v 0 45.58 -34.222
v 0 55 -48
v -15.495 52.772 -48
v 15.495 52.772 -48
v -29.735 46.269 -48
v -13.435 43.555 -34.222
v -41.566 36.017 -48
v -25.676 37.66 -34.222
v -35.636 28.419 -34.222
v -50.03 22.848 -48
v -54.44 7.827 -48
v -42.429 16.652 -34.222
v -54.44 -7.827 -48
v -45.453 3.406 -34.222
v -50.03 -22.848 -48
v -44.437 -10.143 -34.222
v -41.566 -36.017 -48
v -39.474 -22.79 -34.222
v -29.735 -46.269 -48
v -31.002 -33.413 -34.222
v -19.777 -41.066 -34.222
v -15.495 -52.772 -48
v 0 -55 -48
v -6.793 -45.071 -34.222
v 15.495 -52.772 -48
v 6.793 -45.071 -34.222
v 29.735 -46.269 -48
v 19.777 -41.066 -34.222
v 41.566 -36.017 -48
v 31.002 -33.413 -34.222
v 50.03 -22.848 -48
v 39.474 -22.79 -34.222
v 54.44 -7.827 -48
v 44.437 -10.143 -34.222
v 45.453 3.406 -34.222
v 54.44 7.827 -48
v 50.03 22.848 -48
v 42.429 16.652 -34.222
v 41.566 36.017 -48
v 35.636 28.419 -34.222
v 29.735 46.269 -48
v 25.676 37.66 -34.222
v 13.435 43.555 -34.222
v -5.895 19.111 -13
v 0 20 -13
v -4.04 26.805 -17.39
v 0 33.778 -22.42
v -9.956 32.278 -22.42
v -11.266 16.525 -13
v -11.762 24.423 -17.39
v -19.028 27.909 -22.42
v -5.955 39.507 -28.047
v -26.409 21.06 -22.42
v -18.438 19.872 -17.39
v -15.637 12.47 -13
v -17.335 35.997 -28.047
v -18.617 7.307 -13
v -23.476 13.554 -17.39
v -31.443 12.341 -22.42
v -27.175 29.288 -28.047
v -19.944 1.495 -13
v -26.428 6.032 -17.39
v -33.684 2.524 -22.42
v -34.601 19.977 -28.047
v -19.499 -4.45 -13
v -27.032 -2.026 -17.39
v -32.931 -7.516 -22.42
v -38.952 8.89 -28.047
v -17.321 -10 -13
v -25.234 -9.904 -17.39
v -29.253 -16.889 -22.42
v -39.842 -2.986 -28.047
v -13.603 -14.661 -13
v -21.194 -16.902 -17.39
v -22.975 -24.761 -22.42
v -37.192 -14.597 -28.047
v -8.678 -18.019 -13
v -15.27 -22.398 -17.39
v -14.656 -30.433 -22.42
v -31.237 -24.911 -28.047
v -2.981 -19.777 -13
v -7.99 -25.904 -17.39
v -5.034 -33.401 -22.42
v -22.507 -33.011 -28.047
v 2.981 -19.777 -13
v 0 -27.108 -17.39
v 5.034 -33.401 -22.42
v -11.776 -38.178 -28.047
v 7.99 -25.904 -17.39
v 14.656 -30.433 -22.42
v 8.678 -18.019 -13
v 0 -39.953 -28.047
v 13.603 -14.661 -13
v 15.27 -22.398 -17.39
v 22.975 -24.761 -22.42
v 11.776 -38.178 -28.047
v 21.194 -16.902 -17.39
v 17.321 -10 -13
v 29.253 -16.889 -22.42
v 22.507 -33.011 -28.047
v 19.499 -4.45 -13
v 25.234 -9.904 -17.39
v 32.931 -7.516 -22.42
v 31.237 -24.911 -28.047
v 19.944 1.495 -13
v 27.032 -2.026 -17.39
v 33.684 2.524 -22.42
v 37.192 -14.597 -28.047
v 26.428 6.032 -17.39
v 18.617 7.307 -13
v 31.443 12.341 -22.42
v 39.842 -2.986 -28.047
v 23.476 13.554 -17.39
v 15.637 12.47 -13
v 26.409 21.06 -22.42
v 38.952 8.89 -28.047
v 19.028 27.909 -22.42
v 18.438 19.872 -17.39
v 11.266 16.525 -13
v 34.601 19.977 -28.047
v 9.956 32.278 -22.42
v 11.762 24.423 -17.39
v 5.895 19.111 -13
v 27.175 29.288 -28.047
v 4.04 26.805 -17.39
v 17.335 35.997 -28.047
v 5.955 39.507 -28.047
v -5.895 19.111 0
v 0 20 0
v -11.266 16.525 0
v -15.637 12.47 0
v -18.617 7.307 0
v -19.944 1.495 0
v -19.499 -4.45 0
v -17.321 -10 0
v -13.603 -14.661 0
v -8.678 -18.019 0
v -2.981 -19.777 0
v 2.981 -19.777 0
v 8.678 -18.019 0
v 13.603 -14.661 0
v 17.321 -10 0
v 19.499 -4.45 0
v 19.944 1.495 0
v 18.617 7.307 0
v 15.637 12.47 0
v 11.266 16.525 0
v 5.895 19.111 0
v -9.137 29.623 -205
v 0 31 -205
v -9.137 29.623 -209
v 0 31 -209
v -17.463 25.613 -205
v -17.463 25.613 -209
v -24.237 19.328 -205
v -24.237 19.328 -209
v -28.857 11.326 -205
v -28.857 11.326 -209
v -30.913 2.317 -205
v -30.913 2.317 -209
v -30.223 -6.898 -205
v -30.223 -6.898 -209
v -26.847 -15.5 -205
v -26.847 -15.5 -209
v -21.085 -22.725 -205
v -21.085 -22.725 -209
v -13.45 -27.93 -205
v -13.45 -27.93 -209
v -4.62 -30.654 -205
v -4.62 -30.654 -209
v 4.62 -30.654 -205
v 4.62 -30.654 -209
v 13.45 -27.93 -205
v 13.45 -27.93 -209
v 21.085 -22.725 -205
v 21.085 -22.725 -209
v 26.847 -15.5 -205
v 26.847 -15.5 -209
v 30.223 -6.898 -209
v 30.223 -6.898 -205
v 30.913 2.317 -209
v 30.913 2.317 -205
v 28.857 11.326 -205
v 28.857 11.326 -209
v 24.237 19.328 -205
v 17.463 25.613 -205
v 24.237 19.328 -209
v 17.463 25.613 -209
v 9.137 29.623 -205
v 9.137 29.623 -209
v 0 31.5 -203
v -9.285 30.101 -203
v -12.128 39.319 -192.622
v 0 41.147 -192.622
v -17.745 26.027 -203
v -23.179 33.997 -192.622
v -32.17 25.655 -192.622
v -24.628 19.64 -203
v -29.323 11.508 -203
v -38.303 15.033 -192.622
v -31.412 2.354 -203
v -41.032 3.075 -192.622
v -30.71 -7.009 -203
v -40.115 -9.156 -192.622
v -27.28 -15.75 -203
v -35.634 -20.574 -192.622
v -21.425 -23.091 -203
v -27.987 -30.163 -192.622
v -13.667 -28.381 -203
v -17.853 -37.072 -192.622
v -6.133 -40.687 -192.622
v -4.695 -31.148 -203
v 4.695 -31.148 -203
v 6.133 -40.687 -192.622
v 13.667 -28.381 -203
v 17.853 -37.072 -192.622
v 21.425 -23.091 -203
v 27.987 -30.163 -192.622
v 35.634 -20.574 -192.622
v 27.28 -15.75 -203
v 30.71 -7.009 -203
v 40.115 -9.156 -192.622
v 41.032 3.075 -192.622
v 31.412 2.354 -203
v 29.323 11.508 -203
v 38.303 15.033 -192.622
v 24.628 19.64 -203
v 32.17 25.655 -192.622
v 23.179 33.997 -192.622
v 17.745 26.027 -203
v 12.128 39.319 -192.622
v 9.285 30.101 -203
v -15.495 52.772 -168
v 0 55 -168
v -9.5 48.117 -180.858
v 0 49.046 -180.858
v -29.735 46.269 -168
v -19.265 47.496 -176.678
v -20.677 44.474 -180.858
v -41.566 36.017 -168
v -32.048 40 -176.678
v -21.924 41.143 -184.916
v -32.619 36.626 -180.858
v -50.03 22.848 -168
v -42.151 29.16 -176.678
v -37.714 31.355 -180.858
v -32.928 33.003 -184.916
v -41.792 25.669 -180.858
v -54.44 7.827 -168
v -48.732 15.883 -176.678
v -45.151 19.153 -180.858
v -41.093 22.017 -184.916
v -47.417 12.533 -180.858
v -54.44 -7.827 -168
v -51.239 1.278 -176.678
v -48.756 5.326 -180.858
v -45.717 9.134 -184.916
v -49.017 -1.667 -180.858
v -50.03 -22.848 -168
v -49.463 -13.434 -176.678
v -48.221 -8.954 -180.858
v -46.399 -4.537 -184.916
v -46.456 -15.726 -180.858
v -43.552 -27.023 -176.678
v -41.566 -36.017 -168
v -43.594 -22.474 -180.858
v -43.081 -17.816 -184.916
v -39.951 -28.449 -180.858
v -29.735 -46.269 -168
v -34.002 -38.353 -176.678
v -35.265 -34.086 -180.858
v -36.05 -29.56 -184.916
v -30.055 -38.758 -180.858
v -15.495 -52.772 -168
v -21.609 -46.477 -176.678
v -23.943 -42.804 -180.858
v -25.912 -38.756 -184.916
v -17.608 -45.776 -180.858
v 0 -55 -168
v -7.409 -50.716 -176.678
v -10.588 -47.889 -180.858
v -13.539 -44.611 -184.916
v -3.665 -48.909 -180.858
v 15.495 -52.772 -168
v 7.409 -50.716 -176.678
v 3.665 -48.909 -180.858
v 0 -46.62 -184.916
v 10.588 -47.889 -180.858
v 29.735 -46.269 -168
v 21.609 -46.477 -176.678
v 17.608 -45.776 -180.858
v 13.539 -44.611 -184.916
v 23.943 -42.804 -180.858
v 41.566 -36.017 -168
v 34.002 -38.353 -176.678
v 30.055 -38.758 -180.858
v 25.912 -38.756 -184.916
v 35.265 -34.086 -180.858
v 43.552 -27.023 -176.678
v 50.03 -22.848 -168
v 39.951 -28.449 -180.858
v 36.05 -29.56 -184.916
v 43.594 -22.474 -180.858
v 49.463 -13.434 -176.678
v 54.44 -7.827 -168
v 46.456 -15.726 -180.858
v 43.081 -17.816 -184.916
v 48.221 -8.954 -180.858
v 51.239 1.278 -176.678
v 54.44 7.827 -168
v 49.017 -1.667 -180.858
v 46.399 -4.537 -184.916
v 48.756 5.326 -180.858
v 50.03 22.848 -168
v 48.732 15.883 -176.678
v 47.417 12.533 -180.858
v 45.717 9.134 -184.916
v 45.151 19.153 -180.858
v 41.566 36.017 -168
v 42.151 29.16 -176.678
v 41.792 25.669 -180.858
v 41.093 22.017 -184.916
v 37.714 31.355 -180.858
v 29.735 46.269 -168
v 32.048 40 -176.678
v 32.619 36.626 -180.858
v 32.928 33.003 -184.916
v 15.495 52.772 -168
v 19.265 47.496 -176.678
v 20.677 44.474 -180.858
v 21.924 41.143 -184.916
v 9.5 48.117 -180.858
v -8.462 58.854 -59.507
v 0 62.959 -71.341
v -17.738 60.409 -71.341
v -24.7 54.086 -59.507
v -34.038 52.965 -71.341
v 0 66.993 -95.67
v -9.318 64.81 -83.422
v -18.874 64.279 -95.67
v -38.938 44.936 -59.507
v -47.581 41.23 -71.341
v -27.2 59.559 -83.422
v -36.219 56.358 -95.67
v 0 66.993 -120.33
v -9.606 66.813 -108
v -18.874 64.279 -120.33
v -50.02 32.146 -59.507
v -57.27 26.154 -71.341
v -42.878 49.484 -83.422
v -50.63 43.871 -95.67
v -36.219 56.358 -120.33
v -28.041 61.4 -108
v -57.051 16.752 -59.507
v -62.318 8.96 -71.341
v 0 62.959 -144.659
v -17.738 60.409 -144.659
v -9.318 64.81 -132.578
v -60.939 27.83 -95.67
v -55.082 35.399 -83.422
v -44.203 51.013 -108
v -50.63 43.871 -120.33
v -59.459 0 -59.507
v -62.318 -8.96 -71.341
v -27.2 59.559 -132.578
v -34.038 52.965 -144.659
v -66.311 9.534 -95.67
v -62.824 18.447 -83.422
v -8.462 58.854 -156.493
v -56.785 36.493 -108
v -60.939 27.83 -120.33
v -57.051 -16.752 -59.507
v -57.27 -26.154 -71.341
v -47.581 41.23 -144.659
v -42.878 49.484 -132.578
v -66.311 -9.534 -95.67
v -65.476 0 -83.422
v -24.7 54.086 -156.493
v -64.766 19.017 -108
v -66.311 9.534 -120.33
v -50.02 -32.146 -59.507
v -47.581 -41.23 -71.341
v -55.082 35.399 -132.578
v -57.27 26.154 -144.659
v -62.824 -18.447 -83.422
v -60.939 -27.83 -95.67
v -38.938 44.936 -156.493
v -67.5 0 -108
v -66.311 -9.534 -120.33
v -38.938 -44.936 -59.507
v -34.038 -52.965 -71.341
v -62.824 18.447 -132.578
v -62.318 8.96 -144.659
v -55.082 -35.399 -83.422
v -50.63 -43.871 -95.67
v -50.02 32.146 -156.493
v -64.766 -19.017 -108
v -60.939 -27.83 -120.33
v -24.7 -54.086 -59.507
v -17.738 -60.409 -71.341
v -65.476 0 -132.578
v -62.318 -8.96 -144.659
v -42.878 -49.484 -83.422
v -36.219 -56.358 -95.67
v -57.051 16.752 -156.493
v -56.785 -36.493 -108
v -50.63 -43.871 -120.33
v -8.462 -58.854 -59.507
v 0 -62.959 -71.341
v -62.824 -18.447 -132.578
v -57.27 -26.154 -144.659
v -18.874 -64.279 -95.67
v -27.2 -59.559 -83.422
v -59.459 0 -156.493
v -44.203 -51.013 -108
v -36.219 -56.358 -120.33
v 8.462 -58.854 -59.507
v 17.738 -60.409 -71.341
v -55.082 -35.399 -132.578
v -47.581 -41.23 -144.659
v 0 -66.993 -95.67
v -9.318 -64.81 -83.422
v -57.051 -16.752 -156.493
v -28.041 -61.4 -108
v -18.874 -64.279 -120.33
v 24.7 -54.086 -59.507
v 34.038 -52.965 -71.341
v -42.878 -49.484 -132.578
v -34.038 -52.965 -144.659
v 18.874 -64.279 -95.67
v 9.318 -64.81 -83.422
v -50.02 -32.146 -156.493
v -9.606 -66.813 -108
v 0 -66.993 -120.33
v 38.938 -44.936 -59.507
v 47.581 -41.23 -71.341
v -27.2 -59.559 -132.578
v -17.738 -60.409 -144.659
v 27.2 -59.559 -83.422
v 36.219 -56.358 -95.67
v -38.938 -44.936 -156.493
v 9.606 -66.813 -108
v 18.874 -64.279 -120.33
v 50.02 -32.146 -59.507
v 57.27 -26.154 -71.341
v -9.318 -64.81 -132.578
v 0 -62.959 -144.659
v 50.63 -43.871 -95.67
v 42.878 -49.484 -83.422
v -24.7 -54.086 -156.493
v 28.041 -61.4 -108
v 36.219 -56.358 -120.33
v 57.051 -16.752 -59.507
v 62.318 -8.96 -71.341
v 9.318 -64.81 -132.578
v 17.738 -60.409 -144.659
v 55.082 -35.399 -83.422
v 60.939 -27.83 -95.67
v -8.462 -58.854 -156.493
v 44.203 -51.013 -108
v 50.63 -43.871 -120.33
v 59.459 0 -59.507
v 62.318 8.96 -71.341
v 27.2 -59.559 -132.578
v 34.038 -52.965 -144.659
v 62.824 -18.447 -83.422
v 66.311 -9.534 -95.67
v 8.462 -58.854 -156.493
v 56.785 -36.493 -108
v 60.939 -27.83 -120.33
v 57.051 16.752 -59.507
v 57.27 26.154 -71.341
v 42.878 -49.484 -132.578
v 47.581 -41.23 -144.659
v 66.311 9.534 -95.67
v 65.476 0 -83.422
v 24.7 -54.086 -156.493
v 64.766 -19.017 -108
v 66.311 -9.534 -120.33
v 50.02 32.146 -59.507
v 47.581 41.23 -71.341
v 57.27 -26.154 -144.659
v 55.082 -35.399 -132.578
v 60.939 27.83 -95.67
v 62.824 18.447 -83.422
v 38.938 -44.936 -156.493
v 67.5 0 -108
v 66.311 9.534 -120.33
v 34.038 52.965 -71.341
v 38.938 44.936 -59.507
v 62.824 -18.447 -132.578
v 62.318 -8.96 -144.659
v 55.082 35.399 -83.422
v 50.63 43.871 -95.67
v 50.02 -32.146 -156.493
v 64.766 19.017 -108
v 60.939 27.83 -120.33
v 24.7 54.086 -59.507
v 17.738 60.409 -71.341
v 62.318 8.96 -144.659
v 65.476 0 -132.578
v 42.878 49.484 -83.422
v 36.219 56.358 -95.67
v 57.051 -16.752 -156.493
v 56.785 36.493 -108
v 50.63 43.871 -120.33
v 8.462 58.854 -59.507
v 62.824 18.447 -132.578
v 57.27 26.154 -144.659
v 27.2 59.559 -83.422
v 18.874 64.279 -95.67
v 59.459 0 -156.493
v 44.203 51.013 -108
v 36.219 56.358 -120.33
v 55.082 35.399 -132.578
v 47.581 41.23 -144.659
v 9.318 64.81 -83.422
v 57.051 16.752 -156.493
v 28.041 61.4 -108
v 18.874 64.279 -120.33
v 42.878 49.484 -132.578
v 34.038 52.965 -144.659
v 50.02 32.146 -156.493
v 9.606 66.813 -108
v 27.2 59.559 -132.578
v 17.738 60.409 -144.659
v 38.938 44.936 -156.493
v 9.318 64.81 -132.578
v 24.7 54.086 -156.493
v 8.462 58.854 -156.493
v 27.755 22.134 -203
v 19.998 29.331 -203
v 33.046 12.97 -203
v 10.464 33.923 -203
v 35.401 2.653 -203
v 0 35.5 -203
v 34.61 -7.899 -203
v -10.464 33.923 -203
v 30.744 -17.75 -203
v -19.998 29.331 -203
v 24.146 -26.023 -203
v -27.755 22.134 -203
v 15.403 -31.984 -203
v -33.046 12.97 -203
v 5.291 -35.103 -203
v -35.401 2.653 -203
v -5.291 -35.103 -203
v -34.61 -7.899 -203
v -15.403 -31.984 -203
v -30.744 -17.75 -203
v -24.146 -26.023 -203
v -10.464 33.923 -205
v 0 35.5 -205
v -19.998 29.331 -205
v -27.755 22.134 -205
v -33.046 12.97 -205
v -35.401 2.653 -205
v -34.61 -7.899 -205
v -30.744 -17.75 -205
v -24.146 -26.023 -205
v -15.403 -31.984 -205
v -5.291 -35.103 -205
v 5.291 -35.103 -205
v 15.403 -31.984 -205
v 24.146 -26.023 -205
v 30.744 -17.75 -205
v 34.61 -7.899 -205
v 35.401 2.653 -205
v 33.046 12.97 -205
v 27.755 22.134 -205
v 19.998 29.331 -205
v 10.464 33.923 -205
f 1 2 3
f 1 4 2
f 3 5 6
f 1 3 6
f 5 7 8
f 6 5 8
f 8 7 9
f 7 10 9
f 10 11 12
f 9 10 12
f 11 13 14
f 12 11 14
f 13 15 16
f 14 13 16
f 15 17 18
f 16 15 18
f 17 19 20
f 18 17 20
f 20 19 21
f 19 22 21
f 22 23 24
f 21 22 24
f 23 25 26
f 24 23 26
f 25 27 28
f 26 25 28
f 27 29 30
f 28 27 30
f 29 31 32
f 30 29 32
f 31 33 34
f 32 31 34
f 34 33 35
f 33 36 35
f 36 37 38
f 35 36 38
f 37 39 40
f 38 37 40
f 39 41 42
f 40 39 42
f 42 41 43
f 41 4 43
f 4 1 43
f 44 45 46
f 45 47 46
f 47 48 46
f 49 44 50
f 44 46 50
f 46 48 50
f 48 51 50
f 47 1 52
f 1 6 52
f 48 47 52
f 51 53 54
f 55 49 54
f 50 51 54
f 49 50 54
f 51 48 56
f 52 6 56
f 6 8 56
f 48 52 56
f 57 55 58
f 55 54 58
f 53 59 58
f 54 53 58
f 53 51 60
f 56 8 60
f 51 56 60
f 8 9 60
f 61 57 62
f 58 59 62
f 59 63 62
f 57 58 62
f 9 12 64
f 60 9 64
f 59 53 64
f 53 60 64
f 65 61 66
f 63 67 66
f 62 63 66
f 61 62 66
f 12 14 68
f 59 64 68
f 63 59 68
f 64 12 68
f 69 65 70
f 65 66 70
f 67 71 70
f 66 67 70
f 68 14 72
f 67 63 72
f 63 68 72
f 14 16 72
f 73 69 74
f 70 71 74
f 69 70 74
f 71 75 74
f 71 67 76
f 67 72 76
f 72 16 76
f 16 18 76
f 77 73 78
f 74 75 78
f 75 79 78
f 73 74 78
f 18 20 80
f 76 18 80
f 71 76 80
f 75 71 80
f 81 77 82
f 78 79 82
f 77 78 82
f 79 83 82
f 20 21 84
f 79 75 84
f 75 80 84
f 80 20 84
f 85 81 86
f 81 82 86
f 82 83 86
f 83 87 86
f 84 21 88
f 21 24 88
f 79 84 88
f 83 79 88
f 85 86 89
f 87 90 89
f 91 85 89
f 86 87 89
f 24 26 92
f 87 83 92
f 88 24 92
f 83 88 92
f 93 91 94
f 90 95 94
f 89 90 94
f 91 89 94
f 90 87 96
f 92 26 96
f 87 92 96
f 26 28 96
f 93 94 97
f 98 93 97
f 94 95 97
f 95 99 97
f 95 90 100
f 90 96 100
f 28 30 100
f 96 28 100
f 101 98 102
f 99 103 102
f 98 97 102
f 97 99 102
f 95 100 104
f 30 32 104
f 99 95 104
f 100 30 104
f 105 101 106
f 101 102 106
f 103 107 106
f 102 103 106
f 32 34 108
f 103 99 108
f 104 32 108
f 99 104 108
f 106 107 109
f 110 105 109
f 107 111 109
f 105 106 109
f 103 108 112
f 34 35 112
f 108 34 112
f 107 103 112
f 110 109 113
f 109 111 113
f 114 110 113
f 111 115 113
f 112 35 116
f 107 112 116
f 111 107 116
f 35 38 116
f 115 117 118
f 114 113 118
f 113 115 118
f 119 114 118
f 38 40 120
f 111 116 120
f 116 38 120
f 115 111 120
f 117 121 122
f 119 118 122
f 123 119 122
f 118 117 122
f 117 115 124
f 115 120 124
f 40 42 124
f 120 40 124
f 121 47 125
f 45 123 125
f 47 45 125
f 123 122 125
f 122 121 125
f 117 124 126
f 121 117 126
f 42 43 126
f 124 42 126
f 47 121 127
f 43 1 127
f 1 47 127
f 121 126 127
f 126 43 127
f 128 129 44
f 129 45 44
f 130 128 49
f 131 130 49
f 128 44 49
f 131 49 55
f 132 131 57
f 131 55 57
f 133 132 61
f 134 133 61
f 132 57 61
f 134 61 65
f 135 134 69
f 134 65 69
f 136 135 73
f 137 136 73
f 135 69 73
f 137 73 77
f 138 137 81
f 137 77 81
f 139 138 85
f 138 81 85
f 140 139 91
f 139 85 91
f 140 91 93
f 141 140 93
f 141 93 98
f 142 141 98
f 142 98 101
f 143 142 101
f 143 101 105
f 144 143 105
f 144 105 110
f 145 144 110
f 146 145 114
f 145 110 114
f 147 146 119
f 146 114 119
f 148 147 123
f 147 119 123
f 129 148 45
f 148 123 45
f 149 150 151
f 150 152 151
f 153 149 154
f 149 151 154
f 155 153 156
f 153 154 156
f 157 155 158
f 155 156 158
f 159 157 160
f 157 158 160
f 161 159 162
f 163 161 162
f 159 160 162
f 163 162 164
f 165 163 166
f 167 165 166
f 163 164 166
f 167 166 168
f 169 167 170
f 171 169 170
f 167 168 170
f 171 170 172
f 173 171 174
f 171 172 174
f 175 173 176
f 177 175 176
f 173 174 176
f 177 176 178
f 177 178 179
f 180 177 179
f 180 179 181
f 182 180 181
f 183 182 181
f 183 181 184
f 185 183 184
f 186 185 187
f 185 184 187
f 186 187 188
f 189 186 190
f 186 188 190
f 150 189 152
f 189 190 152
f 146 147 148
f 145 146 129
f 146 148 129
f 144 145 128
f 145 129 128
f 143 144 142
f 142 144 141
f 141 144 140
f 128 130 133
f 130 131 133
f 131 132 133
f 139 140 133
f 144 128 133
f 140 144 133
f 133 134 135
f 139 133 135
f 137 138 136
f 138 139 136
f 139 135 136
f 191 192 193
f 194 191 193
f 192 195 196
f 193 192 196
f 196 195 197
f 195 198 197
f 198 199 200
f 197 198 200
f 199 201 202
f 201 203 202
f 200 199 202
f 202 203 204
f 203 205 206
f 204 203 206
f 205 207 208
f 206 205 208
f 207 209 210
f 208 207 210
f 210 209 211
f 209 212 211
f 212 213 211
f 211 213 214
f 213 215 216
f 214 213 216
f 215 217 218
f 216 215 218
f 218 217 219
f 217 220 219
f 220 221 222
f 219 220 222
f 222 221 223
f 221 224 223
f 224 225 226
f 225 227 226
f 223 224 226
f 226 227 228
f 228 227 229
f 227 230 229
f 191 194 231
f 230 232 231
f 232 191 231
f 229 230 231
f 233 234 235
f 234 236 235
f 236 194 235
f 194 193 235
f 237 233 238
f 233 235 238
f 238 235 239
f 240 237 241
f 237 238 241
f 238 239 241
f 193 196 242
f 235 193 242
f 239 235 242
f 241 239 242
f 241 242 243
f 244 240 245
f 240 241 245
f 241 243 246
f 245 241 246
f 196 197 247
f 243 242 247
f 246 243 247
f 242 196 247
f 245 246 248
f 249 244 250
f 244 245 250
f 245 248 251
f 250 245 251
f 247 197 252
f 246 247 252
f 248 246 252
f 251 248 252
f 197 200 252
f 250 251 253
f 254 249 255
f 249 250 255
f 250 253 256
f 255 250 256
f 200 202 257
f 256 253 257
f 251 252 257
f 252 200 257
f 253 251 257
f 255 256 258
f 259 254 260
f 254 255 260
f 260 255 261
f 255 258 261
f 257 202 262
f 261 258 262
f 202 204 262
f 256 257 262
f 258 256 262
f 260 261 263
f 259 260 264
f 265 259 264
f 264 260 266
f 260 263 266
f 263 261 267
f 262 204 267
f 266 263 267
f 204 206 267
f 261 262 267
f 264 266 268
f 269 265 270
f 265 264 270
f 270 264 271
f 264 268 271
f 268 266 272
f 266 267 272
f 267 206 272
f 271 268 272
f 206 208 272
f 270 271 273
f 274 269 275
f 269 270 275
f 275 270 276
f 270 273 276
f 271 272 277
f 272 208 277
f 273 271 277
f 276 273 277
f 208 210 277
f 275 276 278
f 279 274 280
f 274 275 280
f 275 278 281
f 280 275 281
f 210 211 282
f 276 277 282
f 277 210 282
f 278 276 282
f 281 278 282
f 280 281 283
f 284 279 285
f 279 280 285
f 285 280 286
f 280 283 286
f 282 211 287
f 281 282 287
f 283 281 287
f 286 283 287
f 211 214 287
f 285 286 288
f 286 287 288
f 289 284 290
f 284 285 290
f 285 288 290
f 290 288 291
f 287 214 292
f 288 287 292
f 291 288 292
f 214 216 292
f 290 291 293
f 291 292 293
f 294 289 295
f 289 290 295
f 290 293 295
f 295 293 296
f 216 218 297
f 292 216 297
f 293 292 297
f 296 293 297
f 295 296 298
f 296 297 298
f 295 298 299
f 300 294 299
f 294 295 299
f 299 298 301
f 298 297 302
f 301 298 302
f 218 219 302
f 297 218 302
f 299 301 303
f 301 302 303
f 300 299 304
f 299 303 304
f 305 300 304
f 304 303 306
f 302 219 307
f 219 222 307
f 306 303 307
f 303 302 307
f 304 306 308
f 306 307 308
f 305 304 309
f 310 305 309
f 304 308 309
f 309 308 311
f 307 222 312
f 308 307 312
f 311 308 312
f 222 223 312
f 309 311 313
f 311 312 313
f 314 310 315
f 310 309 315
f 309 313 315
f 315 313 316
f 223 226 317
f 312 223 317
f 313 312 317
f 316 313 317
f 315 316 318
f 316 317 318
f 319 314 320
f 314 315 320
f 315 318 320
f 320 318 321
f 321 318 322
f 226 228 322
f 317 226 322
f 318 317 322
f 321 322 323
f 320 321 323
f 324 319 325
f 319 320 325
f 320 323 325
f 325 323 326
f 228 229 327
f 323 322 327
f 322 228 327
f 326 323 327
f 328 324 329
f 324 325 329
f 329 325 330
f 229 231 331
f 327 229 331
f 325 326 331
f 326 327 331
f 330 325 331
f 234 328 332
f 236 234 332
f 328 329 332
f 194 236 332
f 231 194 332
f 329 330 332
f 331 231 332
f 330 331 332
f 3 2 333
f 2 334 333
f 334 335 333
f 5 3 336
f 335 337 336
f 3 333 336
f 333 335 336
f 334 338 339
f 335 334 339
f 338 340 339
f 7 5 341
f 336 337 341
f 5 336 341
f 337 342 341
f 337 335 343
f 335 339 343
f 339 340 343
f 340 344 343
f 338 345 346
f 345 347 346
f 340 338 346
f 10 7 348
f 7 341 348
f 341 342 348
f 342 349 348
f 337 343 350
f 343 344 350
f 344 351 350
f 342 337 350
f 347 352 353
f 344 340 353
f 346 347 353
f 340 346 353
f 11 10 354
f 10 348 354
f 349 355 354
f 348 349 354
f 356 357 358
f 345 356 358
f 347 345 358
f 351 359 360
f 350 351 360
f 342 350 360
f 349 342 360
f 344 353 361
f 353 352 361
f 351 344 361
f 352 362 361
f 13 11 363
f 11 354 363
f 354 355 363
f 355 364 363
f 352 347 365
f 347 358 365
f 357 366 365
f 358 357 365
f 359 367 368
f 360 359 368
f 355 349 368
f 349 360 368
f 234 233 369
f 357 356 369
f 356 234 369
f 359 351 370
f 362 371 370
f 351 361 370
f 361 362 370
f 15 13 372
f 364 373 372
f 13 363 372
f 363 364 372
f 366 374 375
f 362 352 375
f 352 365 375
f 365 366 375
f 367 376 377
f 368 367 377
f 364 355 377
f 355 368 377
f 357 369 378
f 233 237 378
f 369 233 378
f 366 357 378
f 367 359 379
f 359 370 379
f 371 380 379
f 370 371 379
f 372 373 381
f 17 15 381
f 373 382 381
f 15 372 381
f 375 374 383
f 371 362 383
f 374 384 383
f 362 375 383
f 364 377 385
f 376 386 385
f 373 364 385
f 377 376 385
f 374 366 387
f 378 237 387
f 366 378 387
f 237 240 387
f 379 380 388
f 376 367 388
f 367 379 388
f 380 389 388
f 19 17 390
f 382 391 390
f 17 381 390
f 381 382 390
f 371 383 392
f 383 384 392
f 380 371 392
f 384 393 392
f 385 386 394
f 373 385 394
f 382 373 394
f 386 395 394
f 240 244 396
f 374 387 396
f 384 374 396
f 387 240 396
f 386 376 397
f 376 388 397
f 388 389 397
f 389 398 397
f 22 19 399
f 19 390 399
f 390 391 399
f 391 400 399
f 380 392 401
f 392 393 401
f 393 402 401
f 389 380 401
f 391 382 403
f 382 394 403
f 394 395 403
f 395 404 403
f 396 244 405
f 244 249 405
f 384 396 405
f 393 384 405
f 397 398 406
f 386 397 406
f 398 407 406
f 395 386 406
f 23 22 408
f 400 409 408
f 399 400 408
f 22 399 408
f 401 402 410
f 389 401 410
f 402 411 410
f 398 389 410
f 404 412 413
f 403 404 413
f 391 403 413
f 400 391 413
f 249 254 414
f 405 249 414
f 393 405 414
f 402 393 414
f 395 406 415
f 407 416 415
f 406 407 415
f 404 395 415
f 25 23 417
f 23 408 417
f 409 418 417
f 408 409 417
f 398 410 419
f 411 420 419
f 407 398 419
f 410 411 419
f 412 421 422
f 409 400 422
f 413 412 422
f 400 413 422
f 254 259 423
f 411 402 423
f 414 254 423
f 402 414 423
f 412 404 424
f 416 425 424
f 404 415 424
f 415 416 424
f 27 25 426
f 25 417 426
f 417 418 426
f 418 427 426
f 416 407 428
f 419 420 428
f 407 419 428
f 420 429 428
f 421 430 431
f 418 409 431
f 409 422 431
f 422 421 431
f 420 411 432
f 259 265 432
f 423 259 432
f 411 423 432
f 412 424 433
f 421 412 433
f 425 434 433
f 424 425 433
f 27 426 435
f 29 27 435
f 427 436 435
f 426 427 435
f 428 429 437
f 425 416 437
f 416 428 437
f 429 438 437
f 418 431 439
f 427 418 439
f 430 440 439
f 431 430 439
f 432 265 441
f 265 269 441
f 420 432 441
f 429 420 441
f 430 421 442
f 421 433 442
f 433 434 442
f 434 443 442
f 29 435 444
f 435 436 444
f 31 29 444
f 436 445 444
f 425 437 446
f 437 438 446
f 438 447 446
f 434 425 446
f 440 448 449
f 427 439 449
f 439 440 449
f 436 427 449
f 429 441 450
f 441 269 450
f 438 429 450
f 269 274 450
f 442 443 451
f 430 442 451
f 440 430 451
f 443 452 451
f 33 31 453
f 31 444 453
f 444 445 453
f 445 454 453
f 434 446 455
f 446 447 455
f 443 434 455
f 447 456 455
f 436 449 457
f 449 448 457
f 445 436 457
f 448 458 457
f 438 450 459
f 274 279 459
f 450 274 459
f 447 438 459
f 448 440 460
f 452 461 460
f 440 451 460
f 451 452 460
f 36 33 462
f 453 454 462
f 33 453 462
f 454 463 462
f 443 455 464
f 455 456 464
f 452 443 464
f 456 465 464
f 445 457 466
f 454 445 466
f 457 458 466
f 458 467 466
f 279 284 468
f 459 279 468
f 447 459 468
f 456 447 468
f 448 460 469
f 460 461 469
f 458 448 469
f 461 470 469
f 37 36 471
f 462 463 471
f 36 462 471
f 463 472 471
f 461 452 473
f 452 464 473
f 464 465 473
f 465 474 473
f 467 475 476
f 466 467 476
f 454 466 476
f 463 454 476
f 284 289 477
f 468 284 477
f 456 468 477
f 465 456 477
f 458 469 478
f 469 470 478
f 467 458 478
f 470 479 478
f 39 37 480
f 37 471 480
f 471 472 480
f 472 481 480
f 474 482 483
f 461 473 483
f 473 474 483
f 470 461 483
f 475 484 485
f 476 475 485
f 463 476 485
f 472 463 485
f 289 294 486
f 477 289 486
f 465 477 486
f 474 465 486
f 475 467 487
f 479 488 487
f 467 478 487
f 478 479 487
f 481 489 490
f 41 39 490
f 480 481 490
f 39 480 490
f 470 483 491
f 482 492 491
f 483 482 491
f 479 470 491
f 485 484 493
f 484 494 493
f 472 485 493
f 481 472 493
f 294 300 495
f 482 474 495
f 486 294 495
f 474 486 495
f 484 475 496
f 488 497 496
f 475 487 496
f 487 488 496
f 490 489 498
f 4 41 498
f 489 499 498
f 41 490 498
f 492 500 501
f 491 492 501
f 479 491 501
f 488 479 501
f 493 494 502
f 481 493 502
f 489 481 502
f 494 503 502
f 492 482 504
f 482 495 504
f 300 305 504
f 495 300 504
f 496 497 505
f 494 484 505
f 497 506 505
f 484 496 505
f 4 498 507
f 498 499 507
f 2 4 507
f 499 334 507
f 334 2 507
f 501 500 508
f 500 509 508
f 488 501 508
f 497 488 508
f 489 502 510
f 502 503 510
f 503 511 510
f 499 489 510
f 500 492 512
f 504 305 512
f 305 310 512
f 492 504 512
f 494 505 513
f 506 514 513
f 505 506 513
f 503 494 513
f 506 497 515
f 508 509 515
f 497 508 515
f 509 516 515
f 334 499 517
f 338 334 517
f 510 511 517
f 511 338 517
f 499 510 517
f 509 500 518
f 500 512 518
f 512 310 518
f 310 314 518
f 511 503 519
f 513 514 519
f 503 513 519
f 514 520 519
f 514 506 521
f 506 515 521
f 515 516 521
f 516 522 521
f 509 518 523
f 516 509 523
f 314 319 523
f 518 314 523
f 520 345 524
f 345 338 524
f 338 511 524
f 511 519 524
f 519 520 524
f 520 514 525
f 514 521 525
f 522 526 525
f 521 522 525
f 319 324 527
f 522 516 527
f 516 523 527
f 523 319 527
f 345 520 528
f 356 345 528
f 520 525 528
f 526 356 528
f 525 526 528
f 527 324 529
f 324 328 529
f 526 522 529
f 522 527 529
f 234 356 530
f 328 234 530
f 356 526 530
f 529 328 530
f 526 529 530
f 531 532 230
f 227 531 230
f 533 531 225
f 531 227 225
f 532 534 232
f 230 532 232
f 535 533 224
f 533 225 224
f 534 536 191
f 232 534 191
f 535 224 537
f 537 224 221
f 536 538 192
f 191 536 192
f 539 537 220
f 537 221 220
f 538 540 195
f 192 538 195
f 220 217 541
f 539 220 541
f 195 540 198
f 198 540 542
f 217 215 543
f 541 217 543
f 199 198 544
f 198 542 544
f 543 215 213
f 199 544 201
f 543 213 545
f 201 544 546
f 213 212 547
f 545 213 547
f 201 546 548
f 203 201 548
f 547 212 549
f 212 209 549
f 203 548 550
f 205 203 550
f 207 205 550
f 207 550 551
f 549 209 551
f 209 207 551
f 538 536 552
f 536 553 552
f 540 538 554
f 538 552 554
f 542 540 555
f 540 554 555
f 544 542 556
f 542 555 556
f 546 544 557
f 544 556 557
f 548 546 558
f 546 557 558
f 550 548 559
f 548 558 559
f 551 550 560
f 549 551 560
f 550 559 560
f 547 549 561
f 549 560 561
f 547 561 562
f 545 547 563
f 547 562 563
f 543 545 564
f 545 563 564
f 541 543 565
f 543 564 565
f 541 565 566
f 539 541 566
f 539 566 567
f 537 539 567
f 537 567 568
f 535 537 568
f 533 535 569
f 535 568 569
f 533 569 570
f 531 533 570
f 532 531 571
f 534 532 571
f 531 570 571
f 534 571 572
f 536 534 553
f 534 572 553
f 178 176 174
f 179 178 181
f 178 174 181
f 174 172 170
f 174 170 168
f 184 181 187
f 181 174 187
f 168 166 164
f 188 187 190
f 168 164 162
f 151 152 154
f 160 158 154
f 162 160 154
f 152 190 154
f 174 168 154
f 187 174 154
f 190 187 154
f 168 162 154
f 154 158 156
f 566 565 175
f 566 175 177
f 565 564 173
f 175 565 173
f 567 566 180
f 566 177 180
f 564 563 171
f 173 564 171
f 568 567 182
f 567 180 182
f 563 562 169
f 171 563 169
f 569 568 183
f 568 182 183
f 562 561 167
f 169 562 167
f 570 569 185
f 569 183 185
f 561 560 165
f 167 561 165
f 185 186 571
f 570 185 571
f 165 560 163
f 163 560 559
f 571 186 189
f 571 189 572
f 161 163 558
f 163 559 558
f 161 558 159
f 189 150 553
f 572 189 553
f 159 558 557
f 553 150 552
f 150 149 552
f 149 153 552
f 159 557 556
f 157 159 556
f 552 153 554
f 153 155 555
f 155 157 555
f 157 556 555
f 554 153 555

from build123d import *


with BuildPart() as part:
    # Sketch1 → Revolve1 (revolve)
    with BuildSketch(Plane(origin=(0, 0, 0), x_dir=(0, 0, -1), z_dir=(1, 0, 0))):
        with BuildLine():
            ThreePointArc((168, 55), (186.895377255, 45.328221444), (203, 31.5))
            Line((203, 31.5), (203, 35.5))
            Line((203, 35.5), (205, 35.5))
            Line((205, 35.5), (205, 31))
            Line((205, 31), (209, 31))
            Line((209, 31), (209, 0))
            Line((209, 0), (0, 0))
            Line((0, 0), (0, 20))
            Line((0, 20), (13, 20))
            ThreePointArc((13, 20), (28.046580946, 39.953419054), (48, 55))
            ThreePointArc((48, 55), (108, 67.5), (168, 55))
        make_face()
    revolve(axis=Axis((0, 0, -209), (0, 0, 1)))


solid = part.part
